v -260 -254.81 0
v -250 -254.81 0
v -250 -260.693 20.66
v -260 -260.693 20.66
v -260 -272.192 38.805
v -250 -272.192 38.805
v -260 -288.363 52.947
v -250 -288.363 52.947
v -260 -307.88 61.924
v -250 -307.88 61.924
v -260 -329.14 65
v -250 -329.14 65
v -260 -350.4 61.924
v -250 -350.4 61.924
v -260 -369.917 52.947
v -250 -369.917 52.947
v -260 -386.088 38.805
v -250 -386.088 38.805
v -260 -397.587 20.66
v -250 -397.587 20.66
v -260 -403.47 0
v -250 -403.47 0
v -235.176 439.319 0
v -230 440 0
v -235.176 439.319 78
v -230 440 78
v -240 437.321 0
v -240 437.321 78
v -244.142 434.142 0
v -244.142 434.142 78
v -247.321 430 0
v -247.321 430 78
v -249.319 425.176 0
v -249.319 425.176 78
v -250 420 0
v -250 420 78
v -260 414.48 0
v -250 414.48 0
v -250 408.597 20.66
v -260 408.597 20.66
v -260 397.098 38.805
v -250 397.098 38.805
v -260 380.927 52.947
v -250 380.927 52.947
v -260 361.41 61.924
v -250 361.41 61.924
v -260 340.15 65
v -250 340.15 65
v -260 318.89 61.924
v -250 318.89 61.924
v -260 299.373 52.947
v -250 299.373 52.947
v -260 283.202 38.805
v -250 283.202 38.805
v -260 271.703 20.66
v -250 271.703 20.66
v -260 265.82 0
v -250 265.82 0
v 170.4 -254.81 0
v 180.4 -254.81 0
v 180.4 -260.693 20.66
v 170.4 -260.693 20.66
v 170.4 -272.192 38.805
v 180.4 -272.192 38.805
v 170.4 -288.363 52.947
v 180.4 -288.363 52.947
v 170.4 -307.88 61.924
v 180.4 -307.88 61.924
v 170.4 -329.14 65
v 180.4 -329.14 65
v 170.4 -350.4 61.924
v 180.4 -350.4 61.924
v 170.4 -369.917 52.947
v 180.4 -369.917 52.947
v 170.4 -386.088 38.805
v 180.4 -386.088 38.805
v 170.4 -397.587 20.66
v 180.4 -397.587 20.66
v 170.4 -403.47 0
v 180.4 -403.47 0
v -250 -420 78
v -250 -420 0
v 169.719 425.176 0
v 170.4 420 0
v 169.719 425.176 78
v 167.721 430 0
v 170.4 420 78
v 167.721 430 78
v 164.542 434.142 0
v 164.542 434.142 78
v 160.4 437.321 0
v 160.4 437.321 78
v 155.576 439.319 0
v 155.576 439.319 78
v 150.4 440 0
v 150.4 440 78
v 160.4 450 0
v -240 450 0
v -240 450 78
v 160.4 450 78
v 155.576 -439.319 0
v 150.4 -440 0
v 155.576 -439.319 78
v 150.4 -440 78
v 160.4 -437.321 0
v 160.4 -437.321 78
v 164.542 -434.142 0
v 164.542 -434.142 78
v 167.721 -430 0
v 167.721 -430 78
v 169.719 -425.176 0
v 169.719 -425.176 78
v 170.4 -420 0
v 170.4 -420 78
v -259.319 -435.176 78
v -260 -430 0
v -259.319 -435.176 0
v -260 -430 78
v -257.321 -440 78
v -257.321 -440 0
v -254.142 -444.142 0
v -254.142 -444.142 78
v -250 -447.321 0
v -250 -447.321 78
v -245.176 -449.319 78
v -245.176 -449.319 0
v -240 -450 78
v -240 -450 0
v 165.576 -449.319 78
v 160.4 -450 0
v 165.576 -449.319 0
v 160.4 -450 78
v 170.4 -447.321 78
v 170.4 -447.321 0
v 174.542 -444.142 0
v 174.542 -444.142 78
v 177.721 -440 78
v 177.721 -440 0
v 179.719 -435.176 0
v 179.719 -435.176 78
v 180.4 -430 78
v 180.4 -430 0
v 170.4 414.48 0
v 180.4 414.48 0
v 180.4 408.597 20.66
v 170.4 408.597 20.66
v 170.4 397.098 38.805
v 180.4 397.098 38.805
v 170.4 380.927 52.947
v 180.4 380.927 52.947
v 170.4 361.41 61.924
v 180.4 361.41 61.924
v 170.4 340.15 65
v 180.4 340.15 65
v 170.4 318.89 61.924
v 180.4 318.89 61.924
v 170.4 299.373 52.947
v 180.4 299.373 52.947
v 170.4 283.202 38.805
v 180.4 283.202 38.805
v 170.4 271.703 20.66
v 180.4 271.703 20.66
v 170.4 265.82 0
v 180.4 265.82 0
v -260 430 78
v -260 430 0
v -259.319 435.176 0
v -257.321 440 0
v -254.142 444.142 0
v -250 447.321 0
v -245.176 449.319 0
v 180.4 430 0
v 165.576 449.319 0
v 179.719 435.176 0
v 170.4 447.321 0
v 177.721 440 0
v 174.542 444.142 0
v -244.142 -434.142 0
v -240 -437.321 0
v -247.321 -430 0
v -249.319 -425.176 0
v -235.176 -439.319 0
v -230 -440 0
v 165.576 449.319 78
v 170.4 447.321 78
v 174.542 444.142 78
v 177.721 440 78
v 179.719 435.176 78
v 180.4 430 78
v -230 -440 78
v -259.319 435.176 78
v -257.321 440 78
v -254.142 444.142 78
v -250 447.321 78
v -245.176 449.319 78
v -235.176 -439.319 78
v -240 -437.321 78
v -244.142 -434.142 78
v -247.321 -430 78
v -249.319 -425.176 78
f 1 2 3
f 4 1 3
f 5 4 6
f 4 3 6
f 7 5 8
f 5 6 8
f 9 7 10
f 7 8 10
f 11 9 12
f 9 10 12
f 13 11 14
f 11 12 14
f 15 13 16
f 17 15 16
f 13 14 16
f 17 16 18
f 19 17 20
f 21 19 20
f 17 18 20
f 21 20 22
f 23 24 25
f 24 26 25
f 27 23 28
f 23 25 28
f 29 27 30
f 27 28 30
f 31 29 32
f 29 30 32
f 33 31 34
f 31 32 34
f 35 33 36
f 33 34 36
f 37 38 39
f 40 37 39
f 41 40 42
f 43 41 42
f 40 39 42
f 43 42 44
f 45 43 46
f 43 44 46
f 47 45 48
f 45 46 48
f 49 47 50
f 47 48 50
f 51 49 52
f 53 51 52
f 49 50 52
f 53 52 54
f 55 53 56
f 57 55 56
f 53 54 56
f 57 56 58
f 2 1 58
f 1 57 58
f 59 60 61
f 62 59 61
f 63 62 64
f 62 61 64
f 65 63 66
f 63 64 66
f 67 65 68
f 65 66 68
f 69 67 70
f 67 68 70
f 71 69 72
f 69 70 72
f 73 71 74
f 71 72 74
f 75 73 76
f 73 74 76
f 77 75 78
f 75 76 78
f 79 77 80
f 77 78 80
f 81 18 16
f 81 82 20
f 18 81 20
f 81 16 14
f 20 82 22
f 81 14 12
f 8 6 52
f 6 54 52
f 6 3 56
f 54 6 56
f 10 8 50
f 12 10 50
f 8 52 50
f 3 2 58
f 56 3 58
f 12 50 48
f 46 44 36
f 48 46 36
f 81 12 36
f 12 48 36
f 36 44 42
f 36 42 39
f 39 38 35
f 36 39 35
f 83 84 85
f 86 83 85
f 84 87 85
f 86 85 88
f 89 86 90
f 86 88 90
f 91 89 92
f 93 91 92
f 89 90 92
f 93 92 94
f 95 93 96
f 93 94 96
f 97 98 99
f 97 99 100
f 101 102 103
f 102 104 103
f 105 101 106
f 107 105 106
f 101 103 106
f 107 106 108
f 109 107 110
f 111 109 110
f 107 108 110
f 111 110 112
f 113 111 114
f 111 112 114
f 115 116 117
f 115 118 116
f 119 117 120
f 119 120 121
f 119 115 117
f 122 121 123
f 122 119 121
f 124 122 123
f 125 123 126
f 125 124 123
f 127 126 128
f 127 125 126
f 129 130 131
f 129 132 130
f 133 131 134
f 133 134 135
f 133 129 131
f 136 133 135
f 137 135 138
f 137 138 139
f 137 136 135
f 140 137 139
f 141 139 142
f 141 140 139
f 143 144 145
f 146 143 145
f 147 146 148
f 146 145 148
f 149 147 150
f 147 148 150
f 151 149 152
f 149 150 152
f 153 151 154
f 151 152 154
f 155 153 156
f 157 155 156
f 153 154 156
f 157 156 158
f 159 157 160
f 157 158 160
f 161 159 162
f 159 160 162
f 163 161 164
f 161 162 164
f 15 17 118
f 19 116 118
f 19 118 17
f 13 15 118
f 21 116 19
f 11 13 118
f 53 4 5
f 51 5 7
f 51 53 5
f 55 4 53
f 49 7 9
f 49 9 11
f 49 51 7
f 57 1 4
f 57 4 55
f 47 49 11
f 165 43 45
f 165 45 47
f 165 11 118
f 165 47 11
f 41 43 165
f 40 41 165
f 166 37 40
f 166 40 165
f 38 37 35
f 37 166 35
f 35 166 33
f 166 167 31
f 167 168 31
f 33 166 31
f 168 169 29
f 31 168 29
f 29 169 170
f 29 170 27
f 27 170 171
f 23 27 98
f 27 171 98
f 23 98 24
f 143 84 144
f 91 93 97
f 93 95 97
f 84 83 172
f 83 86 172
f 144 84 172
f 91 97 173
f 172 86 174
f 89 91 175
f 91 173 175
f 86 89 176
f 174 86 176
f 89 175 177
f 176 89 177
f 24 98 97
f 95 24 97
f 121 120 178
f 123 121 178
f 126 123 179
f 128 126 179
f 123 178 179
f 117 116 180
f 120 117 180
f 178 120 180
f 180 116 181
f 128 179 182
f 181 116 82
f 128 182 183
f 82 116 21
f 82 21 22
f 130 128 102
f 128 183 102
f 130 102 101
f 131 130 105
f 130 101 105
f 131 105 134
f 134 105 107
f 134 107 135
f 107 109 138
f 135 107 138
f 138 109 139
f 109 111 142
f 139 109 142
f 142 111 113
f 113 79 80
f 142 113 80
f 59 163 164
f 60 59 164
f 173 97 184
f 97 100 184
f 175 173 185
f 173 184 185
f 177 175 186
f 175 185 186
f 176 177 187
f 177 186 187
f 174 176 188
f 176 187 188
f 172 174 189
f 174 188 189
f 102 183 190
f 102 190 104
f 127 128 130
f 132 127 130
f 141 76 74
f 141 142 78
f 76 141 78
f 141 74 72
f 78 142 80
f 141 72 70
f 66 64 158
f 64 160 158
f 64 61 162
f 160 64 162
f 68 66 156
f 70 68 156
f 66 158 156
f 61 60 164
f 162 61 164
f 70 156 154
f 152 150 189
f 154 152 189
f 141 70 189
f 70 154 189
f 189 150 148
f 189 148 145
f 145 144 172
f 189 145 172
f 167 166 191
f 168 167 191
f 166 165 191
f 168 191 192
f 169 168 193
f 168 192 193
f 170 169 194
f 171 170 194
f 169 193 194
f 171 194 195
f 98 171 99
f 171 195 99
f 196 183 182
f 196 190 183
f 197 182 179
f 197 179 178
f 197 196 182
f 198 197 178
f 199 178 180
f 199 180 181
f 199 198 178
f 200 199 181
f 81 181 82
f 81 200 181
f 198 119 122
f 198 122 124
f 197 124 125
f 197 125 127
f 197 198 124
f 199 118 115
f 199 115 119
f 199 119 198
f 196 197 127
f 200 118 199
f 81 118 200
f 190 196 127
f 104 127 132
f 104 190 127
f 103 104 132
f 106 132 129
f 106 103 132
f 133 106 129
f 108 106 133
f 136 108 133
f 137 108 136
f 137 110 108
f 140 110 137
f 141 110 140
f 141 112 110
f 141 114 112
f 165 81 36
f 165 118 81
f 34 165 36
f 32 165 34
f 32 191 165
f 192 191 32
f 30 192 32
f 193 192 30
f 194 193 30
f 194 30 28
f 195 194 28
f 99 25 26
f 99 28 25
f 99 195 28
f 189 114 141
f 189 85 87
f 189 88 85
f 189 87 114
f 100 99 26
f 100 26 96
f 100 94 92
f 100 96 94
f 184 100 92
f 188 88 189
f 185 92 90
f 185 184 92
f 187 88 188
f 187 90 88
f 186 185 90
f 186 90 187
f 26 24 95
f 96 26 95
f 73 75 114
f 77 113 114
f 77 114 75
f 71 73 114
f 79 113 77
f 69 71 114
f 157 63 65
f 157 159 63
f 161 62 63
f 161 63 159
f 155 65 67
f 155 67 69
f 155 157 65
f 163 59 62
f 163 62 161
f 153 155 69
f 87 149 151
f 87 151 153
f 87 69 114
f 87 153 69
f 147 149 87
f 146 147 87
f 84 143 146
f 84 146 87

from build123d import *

# Parameters (mm, degrees)
SKETCH_1_W          = 440.4
SKETCH_1_H          = 900
SKETCH_1_W_2        = 420.4
SKETCH_1_H_2        = 880
EXTRUDE_1_DEPTH     = 78
FILLET_1_R          = 20
FILLET_2_R          = 20
CUT_EXTRUDE_1_DEPTH = 730
CUT_EXTRUDE_2_DEPTH = 730


with BuildPart() as part:
    # 草图1 → 凸台-拉伸1 (new body)
    with BuildSketch(Plane.XY):
        with Locations((-39.8, 0)):
            Rectangle(SKETCH_1_W, SKETCH_1_H)
        with Locations((-39.8, 0)):
            Rectangle(SKETCH_1_W_2, SKETCH_1_H_2, mode=Mode.SUBTRACT)
    extrude(amount=EXTRUDE_1_DEPTH)

    # 圆角1
    fillet_1_edges = [part.edges().sort_by_distance(p)[0] for p in [
        (180.4, -450, 39),
        (-260, -450, 39),
        (-260, 450, 39),
        (180.4, 450, 39),
    ]]
    fillet(fillet_1_edges, radius=FILLET_1_R)

    # 圆角2
    fillet_2_edges = [part.edges().sort_by_distance(p)[0] for p in [
        (170.4, -440, 39),
        (170.4, 440, 39),
        (-250, 440, 39),
        (-250, -440, 39),
    ]]
    fillet(fillet_2_edges, radius=FILLET_2_R)

    # 草图2 → 切除-拉伸1 (cut)
    with BuildSketch(Plane(origin=(180.4, 0, 0), x_dir=(0, 0, -1), z_dir=(1, 0, 0))):
        with BuildLine():
            Line((0, 265.819656263), (0, 414.480343737))
            ThreePointArc((0, 414.480343737), (-65, 340.15), (0, 265.819656263))
        make_face()
    extrude(amount=-CUT_EXTRUDE_1_DEPTH, mode=Mode.SUBTRACT)

    # 草图3 → 切除-拉伸2 (cut)
    with BuildSketch(Plane(origin=(180.4, 0, 0), x_dir=(0, 0, -1), z_dir=(1, 0, 0))):
        with BuildLine():
            Line((0, -403.470343737), (0, -254.809656263))
            ThreePointArc((0, -254.809656263), (-65, -329.14), (0, -403.470343737))
        make_face()
    extrude(amount=-CUT_EXTRUDE_2_DEPTH, mode=Mode.SUBTRACT)


solid = part.part
